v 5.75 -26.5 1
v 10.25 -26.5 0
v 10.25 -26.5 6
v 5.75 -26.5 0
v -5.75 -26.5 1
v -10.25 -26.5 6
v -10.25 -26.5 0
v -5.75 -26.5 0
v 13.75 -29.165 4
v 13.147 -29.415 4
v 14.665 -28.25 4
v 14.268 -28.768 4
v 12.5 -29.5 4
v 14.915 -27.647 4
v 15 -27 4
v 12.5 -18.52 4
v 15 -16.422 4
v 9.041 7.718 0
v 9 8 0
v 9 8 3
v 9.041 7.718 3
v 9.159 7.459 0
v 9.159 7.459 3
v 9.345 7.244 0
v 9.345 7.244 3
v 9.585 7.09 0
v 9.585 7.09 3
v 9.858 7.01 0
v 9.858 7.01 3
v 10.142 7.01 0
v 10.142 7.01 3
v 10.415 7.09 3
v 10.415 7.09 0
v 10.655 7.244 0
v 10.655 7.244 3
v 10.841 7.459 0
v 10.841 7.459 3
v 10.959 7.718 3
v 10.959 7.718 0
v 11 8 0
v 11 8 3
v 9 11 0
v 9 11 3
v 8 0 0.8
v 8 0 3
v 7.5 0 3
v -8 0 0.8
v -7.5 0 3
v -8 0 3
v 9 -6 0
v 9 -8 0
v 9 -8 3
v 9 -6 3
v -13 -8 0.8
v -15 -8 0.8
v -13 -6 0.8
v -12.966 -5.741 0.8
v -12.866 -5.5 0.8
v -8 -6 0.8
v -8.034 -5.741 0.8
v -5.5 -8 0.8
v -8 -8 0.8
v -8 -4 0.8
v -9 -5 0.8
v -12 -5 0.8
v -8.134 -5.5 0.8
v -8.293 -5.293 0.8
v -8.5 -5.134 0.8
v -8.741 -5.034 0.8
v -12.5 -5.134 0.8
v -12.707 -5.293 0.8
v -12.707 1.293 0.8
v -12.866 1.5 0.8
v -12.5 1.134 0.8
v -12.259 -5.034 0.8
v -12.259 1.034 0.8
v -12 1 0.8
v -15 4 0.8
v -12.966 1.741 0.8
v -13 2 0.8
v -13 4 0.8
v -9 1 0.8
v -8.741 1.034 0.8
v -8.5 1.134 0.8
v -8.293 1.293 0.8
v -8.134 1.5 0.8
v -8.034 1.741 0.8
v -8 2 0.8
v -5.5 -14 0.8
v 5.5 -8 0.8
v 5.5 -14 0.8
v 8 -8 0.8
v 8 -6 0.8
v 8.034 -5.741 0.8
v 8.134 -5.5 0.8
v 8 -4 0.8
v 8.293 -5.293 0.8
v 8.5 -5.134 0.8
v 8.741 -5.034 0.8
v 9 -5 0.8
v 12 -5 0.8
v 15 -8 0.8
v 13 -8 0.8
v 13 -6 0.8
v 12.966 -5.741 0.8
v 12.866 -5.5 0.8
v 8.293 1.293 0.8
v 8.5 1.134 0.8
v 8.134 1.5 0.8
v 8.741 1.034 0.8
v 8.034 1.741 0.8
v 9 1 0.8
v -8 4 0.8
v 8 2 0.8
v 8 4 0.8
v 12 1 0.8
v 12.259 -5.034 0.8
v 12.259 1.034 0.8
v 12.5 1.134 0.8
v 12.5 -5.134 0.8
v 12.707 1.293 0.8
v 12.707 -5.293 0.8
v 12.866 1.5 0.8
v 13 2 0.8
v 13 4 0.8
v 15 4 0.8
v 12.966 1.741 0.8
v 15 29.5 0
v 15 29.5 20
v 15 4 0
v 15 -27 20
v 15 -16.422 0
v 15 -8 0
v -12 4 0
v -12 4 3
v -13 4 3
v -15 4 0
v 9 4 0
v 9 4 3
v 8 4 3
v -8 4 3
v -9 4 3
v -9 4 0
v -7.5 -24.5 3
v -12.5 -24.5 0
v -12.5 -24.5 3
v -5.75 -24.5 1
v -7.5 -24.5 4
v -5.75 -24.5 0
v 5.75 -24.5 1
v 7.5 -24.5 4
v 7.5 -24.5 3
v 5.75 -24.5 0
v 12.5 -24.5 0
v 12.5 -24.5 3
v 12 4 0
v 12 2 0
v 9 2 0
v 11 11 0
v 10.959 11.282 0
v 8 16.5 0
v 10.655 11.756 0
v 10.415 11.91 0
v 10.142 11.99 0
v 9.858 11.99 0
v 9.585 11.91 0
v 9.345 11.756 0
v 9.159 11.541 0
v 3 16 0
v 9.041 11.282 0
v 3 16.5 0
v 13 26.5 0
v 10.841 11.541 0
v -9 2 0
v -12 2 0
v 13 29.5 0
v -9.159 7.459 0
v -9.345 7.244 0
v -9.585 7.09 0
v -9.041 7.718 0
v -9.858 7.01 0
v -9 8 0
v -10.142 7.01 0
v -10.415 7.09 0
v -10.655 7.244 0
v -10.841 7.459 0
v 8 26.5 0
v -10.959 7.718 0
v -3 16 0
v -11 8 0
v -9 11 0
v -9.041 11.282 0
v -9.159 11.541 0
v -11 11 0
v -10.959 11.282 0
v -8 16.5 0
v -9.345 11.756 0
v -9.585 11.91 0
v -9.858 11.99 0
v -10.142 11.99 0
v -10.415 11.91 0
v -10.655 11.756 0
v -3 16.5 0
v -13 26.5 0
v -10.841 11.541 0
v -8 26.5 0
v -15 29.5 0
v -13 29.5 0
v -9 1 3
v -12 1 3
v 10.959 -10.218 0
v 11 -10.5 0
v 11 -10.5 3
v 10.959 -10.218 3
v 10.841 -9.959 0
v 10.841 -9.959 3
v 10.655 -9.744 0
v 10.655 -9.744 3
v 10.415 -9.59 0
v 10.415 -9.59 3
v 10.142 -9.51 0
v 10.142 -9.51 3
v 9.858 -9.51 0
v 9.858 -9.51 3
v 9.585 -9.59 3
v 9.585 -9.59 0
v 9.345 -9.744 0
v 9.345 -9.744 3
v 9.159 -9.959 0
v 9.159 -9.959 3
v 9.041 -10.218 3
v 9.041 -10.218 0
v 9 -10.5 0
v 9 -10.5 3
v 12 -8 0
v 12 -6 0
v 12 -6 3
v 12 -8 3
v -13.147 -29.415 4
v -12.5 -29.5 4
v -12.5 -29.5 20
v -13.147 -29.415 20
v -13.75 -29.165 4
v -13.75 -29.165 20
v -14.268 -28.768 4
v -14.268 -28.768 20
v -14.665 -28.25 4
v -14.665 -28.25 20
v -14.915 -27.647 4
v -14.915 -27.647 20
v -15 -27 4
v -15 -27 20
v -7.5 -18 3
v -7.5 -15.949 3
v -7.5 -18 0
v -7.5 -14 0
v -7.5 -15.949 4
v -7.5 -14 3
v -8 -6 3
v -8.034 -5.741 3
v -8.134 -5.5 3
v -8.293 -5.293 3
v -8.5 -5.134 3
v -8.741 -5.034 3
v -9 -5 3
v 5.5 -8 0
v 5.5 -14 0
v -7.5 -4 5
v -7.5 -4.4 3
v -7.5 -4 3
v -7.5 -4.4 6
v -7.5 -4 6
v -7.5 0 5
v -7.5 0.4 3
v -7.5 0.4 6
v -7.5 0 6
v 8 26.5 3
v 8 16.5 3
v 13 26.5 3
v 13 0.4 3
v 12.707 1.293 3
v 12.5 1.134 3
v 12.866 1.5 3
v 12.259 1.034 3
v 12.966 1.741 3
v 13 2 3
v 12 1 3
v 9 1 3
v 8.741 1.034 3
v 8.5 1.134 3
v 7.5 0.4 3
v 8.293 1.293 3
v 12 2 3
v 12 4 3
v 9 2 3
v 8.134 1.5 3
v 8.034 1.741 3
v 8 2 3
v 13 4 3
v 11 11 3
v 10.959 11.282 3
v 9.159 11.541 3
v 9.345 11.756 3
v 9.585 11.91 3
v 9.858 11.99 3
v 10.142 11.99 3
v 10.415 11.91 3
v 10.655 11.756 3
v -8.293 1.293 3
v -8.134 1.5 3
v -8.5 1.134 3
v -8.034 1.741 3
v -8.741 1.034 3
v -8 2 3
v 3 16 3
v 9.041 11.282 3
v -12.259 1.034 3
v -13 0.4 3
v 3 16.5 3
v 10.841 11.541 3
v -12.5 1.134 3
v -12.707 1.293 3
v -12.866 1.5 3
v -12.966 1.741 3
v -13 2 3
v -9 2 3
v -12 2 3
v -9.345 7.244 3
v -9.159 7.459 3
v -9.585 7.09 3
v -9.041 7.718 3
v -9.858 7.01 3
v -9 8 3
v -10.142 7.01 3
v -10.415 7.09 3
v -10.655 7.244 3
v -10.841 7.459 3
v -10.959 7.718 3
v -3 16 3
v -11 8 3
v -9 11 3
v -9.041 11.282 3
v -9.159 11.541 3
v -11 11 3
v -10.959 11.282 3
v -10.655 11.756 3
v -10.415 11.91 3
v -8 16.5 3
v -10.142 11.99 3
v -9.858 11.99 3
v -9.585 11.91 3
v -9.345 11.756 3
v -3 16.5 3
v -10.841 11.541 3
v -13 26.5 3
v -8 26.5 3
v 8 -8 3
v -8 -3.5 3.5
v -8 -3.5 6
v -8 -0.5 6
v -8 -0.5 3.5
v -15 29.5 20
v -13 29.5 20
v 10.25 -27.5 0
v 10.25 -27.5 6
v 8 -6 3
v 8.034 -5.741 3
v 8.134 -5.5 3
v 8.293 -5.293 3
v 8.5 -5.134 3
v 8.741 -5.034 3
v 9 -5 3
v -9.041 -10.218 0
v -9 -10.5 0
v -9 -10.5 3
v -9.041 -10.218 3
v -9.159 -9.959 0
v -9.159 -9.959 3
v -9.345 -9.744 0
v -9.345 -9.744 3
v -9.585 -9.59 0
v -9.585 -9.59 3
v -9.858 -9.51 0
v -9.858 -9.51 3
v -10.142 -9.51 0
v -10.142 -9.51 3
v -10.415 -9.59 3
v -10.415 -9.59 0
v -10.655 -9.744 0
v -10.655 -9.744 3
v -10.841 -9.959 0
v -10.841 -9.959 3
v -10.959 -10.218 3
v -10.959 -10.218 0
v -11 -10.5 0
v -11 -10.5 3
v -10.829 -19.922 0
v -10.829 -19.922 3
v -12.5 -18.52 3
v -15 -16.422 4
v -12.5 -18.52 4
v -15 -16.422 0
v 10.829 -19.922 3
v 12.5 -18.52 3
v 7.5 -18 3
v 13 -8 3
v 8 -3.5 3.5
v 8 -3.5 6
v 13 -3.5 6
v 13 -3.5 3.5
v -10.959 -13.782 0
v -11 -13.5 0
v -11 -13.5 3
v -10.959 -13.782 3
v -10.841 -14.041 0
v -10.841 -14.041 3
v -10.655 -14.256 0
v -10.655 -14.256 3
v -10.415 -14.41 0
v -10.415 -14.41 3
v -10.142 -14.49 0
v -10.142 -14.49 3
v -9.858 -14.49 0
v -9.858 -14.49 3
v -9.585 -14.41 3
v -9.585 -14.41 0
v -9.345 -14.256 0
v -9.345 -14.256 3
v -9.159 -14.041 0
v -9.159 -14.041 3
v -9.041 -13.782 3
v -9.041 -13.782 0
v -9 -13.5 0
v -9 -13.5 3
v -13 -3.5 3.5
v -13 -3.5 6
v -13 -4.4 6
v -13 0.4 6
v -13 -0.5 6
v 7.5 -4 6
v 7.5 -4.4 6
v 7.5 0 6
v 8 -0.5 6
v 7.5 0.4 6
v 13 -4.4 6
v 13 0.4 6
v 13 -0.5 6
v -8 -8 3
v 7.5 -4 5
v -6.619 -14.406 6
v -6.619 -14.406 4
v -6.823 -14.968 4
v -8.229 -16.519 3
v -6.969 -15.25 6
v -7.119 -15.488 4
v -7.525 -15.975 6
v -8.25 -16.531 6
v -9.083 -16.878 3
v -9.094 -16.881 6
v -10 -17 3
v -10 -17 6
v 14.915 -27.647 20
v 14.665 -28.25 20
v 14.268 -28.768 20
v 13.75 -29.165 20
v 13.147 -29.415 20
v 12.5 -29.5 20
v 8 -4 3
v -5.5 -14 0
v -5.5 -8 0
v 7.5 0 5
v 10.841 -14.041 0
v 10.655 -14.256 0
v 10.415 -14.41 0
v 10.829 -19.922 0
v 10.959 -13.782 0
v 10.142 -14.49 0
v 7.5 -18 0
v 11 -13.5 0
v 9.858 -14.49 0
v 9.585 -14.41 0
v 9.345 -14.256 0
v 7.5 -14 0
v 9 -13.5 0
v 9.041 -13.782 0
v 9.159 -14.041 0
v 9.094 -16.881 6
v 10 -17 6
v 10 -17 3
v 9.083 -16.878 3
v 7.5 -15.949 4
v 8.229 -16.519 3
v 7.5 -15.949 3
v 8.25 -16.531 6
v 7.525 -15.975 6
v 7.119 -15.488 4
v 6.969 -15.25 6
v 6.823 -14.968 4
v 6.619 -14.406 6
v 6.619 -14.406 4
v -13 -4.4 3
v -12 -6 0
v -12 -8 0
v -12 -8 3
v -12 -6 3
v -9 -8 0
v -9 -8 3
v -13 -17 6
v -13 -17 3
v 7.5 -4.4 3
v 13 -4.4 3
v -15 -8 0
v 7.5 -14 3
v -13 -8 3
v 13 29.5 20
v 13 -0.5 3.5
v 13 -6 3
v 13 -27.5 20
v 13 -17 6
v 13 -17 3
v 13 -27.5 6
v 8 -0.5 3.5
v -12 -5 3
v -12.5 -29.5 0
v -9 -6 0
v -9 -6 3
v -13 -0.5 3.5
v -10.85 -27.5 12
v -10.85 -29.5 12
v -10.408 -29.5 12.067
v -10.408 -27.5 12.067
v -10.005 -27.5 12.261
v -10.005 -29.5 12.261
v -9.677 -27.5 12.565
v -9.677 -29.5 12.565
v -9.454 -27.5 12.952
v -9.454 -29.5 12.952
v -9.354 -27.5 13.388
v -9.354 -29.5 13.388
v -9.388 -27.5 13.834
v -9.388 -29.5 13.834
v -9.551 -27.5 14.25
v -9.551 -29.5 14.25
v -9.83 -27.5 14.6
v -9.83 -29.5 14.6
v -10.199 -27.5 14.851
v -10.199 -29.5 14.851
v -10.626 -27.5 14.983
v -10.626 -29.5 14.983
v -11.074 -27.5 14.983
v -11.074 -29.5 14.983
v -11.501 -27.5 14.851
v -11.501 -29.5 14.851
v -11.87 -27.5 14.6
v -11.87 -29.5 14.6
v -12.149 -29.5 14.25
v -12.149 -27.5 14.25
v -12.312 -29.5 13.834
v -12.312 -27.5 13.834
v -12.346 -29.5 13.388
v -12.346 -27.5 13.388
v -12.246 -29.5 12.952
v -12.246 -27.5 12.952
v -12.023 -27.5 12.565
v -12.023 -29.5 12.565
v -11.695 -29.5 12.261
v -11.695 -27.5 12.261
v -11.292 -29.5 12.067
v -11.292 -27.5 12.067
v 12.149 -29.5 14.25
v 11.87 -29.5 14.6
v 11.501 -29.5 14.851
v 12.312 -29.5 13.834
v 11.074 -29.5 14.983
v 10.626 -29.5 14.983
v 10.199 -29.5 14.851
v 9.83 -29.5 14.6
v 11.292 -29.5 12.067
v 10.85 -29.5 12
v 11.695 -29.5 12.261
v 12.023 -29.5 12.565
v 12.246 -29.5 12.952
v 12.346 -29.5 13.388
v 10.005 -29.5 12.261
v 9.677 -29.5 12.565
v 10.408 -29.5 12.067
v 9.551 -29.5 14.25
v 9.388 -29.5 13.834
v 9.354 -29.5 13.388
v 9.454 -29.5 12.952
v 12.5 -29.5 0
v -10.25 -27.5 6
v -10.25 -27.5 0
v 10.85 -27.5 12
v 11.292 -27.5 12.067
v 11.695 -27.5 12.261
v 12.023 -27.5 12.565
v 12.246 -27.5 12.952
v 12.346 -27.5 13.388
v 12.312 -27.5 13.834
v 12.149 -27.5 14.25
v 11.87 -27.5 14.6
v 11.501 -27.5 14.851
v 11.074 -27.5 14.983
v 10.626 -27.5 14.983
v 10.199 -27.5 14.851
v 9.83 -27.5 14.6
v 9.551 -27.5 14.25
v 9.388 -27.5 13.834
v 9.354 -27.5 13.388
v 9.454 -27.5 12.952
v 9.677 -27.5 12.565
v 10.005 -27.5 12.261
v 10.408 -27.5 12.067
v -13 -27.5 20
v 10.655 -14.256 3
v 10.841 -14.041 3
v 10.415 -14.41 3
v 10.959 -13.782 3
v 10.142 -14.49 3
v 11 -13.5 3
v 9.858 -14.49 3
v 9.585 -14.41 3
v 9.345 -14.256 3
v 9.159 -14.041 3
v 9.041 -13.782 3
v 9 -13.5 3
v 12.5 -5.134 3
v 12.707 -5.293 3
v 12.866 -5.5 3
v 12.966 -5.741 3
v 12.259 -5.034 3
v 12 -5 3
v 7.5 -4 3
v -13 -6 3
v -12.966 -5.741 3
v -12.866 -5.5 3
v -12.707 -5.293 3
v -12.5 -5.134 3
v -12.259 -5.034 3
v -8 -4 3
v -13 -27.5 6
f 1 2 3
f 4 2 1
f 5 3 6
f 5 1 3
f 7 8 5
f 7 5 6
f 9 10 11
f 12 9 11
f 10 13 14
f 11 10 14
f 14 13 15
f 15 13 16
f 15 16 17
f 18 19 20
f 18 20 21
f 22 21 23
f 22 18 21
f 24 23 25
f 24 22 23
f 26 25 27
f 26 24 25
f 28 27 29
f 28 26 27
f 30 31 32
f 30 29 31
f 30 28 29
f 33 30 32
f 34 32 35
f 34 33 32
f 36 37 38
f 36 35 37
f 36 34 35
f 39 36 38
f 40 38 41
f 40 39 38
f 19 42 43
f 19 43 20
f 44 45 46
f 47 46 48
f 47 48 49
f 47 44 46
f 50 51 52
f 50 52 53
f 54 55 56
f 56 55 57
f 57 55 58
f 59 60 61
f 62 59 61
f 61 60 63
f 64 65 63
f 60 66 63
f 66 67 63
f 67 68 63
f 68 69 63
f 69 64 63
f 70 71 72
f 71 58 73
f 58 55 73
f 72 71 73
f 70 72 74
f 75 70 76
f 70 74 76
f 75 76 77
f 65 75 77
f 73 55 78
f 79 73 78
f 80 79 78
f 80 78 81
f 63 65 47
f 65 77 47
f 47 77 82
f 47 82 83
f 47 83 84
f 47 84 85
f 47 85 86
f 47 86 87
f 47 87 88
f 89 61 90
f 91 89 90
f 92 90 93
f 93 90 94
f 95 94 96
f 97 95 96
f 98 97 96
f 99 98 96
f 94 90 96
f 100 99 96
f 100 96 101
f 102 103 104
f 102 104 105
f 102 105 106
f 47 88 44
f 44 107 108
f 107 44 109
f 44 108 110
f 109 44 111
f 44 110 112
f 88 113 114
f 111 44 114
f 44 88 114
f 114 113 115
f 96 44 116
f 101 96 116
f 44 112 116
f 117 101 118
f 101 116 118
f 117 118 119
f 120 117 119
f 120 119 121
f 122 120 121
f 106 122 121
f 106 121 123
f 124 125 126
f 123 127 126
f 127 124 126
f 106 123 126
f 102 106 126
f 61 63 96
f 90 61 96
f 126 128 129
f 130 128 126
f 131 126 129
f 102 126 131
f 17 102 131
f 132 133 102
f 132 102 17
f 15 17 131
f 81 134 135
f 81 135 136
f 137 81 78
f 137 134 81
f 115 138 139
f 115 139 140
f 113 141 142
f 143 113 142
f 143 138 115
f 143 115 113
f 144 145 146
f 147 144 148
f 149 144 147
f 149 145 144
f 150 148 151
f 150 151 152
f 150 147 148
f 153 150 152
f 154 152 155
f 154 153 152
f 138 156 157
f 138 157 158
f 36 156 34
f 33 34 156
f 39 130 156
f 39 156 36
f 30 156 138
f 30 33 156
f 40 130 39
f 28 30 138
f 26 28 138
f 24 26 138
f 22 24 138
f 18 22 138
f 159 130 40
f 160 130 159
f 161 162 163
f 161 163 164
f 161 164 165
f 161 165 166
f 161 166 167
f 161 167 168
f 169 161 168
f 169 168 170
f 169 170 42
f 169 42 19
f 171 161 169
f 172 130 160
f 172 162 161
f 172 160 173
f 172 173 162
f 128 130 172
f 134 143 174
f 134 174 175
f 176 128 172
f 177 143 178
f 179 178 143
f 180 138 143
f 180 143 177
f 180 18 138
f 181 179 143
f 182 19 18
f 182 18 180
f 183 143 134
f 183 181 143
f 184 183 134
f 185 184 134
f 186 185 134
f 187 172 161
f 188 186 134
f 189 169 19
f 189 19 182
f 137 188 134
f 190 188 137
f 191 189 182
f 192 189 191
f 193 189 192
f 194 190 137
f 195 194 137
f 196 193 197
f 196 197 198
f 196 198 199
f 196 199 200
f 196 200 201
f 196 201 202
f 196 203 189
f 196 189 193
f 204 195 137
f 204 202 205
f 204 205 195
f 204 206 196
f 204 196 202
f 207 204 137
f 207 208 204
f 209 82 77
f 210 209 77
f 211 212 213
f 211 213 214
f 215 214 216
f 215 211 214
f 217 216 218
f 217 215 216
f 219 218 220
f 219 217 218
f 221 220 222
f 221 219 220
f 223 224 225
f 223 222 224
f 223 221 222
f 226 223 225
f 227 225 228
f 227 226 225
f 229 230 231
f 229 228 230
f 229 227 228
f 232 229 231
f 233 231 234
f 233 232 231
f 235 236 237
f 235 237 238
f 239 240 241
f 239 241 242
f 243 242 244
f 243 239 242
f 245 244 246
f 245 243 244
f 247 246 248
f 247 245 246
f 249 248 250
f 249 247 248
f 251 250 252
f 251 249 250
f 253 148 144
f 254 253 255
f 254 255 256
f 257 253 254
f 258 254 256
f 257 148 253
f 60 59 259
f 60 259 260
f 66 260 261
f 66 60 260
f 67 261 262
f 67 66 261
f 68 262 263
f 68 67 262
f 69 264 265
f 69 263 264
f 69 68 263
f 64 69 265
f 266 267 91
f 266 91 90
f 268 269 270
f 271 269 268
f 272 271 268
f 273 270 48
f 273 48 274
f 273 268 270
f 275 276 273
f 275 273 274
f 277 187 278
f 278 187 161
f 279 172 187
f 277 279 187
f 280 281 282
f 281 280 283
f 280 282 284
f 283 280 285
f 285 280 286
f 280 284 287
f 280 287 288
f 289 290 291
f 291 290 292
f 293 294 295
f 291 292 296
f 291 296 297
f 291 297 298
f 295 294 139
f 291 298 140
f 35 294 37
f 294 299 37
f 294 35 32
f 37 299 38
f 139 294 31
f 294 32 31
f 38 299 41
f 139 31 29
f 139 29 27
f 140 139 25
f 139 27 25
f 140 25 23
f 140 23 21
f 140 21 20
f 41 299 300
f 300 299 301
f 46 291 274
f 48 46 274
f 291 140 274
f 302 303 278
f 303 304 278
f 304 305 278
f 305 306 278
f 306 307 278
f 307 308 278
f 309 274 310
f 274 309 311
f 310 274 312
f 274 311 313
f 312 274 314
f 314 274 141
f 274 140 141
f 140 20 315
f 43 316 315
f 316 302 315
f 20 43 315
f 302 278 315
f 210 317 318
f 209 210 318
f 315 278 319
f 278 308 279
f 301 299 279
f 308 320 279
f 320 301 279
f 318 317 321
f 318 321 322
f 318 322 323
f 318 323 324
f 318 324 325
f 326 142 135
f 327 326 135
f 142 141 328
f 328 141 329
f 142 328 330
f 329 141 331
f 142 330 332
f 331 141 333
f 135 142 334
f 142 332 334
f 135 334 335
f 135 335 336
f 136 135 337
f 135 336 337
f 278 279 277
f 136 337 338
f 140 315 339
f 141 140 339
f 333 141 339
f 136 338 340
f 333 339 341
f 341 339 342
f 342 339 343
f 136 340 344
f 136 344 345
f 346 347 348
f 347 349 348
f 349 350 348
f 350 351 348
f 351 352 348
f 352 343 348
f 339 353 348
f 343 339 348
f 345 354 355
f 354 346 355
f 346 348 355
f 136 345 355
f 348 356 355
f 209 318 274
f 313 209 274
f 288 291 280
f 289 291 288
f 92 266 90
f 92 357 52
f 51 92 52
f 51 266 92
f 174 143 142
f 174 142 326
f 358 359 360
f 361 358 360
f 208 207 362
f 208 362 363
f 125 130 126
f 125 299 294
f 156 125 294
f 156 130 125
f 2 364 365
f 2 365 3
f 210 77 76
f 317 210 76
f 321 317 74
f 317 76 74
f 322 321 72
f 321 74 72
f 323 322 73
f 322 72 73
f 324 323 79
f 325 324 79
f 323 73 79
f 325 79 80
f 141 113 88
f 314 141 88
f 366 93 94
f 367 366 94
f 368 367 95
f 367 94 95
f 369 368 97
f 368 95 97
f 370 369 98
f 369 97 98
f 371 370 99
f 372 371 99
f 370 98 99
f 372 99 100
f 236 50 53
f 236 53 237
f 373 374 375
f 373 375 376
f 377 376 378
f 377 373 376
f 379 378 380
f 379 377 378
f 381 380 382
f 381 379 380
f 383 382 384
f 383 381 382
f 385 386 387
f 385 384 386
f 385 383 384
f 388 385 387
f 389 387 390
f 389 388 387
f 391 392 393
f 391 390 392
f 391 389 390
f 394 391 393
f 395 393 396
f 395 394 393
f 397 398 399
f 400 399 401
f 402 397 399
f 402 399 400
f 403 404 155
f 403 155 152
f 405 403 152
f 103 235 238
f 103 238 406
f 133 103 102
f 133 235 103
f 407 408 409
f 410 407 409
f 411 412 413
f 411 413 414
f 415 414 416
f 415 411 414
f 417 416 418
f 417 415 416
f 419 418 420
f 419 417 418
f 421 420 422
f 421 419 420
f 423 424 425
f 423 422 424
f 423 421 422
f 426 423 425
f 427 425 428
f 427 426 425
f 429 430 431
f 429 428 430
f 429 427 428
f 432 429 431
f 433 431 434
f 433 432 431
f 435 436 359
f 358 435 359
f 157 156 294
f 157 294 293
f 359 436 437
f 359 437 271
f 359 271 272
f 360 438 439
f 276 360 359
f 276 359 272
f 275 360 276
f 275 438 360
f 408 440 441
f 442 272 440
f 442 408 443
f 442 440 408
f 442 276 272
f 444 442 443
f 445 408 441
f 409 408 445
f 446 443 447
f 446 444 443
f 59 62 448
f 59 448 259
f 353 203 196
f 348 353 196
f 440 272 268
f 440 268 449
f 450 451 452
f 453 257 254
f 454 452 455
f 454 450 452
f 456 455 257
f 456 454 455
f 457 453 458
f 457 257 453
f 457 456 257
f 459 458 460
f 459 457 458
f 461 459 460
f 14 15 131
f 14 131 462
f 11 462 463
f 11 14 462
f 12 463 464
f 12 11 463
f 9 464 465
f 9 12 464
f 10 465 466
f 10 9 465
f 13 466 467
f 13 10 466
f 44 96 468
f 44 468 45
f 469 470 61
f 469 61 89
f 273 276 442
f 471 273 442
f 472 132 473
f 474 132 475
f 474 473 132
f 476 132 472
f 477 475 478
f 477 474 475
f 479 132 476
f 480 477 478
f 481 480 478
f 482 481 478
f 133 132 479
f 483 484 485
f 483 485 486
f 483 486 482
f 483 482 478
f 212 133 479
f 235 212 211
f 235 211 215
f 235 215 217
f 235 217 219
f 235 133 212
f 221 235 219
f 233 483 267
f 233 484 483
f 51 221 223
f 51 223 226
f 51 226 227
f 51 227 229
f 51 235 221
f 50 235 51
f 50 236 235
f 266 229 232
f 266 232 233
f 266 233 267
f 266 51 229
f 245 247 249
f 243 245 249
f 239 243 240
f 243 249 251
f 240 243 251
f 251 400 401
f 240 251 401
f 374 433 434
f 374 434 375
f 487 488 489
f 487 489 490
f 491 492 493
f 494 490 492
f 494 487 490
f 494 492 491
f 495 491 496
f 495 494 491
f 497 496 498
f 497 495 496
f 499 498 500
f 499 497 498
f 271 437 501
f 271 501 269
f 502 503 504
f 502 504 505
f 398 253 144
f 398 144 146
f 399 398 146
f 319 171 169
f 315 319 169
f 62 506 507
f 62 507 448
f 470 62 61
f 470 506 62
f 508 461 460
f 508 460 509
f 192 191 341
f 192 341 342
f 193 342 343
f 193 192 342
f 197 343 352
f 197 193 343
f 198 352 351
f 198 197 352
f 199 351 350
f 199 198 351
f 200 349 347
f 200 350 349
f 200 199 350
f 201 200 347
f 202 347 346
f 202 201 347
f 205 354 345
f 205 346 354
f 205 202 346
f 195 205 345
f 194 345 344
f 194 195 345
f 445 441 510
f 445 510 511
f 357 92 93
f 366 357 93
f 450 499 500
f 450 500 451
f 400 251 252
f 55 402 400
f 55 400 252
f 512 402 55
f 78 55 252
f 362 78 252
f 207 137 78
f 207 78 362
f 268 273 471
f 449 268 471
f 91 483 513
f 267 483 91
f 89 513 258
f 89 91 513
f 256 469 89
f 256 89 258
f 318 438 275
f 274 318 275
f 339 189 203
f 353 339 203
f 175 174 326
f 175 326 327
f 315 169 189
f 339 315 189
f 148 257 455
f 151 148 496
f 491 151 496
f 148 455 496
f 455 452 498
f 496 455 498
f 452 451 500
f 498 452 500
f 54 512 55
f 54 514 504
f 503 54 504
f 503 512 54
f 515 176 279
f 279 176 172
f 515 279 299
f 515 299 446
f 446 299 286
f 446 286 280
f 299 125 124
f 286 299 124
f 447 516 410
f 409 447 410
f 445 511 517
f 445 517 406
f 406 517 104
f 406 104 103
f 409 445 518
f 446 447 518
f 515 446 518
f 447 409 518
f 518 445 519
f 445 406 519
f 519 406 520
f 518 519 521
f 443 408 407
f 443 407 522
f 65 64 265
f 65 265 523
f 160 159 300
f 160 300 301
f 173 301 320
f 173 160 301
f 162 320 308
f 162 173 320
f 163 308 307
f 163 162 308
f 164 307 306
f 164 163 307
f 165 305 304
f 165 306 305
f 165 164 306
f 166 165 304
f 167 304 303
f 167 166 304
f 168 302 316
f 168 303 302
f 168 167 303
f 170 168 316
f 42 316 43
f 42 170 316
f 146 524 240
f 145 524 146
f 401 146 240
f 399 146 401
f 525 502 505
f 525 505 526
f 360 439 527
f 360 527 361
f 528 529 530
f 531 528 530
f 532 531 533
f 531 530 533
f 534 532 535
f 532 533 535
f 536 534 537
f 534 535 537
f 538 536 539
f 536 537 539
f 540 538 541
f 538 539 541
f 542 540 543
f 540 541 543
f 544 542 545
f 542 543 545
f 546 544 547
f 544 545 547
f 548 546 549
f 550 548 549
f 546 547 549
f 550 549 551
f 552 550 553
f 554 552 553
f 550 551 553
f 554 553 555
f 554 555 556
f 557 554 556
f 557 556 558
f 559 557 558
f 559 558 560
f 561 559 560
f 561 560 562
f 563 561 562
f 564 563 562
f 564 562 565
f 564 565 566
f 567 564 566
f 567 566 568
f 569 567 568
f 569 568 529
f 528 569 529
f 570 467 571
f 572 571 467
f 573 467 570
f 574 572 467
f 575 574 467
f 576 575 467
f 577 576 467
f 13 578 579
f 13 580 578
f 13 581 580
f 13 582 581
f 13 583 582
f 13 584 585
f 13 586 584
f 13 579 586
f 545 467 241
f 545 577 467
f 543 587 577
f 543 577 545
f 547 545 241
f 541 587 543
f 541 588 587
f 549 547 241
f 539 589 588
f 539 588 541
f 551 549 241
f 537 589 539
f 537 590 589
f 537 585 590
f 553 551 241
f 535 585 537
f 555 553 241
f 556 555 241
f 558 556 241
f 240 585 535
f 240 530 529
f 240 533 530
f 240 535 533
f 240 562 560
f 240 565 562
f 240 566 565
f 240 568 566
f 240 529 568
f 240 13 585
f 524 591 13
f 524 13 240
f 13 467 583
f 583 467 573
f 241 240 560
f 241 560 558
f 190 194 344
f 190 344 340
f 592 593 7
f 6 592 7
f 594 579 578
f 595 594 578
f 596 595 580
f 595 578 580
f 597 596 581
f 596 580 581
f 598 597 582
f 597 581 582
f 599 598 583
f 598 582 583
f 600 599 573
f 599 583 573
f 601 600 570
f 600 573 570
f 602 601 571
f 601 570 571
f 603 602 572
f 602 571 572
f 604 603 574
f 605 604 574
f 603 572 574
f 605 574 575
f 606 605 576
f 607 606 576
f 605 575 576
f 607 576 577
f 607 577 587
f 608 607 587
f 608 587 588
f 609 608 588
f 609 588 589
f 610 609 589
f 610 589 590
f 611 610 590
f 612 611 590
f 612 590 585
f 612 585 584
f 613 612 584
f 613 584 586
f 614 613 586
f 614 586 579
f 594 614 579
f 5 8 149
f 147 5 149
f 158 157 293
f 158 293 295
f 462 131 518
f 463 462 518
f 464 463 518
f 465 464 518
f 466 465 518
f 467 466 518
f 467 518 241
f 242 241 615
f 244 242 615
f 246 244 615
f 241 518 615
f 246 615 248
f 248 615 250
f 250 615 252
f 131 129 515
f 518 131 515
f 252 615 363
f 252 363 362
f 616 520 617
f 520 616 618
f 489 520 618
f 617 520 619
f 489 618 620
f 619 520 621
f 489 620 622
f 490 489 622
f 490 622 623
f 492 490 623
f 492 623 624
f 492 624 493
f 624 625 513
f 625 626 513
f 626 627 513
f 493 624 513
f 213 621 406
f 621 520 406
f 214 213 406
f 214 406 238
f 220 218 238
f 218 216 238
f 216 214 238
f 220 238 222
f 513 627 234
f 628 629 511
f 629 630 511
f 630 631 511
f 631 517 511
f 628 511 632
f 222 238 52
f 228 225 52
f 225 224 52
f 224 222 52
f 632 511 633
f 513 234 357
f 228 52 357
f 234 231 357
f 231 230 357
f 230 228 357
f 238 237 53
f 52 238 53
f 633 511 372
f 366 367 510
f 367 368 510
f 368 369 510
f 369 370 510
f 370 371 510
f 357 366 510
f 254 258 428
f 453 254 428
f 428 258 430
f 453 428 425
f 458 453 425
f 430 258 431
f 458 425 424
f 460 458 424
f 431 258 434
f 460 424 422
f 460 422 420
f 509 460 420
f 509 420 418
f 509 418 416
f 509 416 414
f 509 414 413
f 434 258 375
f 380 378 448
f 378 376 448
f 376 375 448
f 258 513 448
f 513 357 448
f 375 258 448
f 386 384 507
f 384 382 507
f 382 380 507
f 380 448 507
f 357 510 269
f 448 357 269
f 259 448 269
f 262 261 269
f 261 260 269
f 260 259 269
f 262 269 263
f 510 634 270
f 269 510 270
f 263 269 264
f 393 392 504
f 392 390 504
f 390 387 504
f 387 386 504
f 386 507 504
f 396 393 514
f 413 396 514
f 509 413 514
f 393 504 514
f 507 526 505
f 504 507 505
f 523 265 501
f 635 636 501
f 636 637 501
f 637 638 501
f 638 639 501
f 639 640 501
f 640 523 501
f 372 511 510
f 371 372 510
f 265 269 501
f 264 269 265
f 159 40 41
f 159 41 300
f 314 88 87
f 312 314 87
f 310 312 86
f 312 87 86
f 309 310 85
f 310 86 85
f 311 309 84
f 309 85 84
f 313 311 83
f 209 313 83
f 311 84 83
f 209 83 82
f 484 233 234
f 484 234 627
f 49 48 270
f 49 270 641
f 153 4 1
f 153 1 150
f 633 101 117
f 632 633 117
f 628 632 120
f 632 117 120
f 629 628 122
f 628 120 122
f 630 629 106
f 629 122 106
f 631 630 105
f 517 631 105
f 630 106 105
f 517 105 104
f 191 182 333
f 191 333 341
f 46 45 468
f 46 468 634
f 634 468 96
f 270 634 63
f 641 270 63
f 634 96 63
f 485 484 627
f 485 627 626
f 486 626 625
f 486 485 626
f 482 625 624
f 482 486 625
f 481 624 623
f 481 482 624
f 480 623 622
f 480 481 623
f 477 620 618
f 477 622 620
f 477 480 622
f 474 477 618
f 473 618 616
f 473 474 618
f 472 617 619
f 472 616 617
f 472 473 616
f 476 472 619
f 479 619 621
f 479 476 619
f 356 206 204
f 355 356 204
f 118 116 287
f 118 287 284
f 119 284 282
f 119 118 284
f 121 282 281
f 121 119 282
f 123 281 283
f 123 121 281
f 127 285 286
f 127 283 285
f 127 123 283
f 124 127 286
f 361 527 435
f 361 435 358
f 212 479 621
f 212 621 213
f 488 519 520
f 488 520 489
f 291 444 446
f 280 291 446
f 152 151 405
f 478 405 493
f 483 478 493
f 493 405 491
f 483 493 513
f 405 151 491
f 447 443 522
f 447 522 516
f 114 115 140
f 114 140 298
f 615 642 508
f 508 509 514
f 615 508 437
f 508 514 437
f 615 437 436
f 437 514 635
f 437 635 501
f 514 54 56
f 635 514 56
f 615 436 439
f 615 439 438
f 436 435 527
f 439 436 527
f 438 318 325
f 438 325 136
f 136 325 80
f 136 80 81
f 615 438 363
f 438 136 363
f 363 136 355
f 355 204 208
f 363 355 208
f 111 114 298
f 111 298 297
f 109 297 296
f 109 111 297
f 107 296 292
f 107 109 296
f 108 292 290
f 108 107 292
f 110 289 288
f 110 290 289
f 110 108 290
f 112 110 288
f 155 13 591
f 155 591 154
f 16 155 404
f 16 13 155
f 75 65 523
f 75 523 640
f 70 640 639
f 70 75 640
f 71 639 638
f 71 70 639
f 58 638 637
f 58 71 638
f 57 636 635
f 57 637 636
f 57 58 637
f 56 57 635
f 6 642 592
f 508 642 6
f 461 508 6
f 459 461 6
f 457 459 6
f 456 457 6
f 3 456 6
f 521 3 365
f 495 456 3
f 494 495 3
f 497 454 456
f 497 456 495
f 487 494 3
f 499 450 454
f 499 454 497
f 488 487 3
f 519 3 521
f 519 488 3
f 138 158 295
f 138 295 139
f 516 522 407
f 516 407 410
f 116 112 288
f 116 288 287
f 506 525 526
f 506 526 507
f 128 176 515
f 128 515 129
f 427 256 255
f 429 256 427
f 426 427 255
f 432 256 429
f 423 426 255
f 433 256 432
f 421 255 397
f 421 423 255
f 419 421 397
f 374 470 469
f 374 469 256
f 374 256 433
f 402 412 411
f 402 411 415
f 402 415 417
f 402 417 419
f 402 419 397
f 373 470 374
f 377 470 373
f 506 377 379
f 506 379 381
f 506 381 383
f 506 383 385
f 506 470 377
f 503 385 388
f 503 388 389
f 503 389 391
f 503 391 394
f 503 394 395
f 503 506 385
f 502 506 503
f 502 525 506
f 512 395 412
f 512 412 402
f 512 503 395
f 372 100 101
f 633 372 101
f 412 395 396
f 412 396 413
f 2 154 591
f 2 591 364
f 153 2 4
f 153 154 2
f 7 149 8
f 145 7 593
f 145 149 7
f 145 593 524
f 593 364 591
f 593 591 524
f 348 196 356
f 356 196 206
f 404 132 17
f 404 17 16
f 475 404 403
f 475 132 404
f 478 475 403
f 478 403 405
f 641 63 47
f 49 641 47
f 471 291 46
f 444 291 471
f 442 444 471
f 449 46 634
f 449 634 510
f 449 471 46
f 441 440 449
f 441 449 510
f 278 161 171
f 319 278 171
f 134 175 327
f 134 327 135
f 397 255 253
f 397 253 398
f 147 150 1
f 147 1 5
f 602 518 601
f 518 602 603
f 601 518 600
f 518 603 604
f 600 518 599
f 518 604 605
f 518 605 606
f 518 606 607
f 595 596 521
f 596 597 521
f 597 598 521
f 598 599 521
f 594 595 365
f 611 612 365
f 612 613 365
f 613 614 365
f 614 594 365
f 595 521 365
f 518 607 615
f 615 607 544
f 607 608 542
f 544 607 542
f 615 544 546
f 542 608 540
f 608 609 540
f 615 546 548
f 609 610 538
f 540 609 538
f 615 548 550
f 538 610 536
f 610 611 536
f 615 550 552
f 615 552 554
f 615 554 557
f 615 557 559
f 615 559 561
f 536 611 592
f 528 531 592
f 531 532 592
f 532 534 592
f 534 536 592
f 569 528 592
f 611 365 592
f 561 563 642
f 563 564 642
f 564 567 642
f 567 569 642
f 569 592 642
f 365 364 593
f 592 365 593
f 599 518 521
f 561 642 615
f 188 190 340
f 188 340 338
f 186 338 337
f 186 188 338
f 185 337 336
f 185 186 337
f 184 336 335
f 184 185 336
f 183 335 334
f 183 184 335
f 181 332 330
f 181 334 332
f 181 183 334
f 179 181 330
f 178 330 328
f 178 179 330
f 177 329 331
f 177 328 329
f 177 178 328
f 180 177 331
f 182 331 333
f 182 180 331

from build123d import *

# Parameters (mm, degrees)
BOSS_EXTRUDE1_DEPTH = 20
CUT_EXTRUDE1_DEPTH  = 39.668462602
CUT_EXTRUDE2_DEPTH  = 39.668462602
SKETCH4_W           = 26
SKETCH4_H           = 57
CUT_EXTRUDE3_DEPTH  = 14
CUT_EXTRUDE4_DEPTH  = 0.8
CUT_EXTRUDE5_DEPTH  = 39.260815464
CUT_EXTRUDE6_DEPTH  = 4
SKETCH8_W           = 5
SKETCH8_H           = 6.5
BOSS_EXTRUDE2_DEPTH = 1
SKETCH9_W           = 20.5
SKETCH9_H           = 1
CUT_EXTRUDE7_DEPTH  = 39.668462602
SKETCH10_W          = 11.5
SKETCH10_H          = 2
CUT_EXTRUDE8_DEPTH  = 1
CUT_EXTRUDE9_DEPTH  = 3
CUT_EXTRUDE10_REACH = 40.668
SKETCH12_W          = 15
SKETCH12_H          = 2
SKETCH13_W          = 16
SKETCH13_H          = 4
CUT_EXTRUDE11_DEPTH = 2.2
SKETCH14_W          = 5
SKETCH14_H          = 3
CUT_EXTRUDE12_DEPTH = 2.5
CUT_EXTRUDE13_REACH = 66.078
SKETCH15_R          = 1.5


with BuildPart() as part:
    # Sketch1 → Boss-Extrude1 (new body)
    with BuildSketch(Plane.XY):
        with BuildLine():
            Line((-15, 29.5), (15, 29.5))
            Line((15, 29.5), (15, -27))
            ThreePointArc((15, -27), (14.267766953, -28.767766953), (12.5, -29.5))
            Line((12.5, -29.5), (-12.5, -29.5))
            ThreePointArc((-12.5, -29.5), (-14.267766953, -28.767766953), (-15, -27))
            Line((-15, -27), (-15, 29.5))
        make_face()
    extrude(amount=BOSS_EXTRUDE1_DEPTH)

    # Sketch2 → Cut-Extrude1 (cut, through all)
    with BuildSketch(Plane(origin=(0, 0, 0), x_dir=(-1, 0, 0), z_dir=(0, 0, -1))):
        Polygon((-13, 29.5), (-13, 26.5), (-8, 26.5), (-8, 16.5), (-3, 16.5), (-3, 16), (3, 16), (3, 16.5), (8, 16.5), (8, 26.5), (13, 26.5), (13, 29.5), align=None)
    extrude(amount=-CUT_EXTRUDE1_DEPTH, mode=Mode.SUBTRACT)

    # Sketch3 → Cut-Extrude2 (cut, through all)
    with BuildSketch(Plane(origin=(0, 0, 0), x_dir=(-1, 0, 0), z_dir=(0, 0, -1))):
        with BuildLine():
            Line((-9, 11), (-9, 8))
            ThreePointArc((-9, 8), (-10, 7), (-11, 8))
            Line((-11, 8), (-11, 11))
            ThreePointArc((-11, 11), (-10, 12), (-9, 11))
        make_face()
        with BuildLine():
            Line((9, 8), (9, 11))
            ThreePointArc((9, 11), (10, 12), (11, 11))
            Line((11, 11), (11, 8))
            ThreePointArc((11, 8), (10, 7), (9, 8))
        make_face()
        with BuildLine():
            Line((9, -13.5), (9, -10.5))
            ThreePointArc((9, -10.5), (10, -9.5), (11, -10.5))
            Line((11, -10.5), (11, -13.5))
            ThreePointArc((11, -13.5), (10, -14.5), (9, -13.5))
        make_face()
        with BuildLine():
            Line((-9, -10.5), (-9, -13.5))
            ThreePointArc((-9, -13.5), (-10, -14.5), (-11, -13.5))
            Line((-11, -13.5), (-11, -10.5))
            ThreePointArc((-11, -10.5), (-10, -9.5), (-9, -10.5))
        make_face()
    extrude(amount=-CUT_EXTRUDE2_DEPTH, mode=Mode.SUBTRACT)

    # Sketch4 → Cut-Extrude3 (cut)
    with BuildSketch(Plane.XY.offset(20)):
        with Locations((0, 1)):
            Rectangle(SKETCH4_W, SKETCH4_H)
    extrude(amount=-CUT_EXTRUDE3_DEPTH, mode=Mode.SUBTRACT)

    # Sketch5 → Cut-Extrude4 (cut)
    with BuildSketch(Plane(origin=(0, 0, 0), x_dir=(-1, 0, 0), z_dir=(0, 0, -1))):
        Polygon((-15, 4), (-12, 4), (-12, 2), (-9, 2), (-9, 4), (9, 4), (9, 2), (12, 2), (12, 4), (15, 4), (15, -8), (12, -8), (12, -6), (9, -6), (9, -8), (5.5, -8), (5.5, -14), (-5.5, -14), (-5.5, -8), (-9, -8), (-9, -6), (-12, -6), (-12, -8), (-15, -8), align=None)
    extrude(amount=-CUT_EXTRUDE4_DEPTH, mode=Mode.SUBTRACT)

    # Sketch6 → Cut-Extrude5 (cut, through all)
    with BuildSketch(Plane(origin=(0, 0, 0.8), x_dir=(-1, 0, 0), z_dir=(0, 0, -1))):
        with BuildLine():
            Line((-12, 4), (-12, 2))
            Line((-12, 2), (-9, 2))
            Line((-9, 2), (-9, 4))
            Line((-9, 4), (-8, 4))
            Line((-8, 4), (-8, 2))
            ThreePointArc((-8, 2), (-8.292893219, 1.292893219), (-9, 1))
            Line((-9, 1), (-12, 1))
            ThreePointArc((-12, 1), (-12.707106781, 1.292893219), (-13, 2))
            Line((-13, 2), (-13, 4))
            Line((-13, 4), (-12, 4))
        make_face()
        with BuildLine():
            Line((13, 4), (12, 4))
            Line((12, 4), (12, 2))
            Line((12, 2), (9, 2))
            Line((9, 2), (9, 4))
            Line((9, 4), (8, 4))
            Line((8, 4), (8, 2))
            ThreePointArc((8, 2), (8.292893219, 1.292893219), (9, 1))
            Line((9, 1), (12, 1))
            ThreePointArc((12, 1), (12.707106781, 1.292893219), (13, 2))
            Line((13, 2), (13, 4))
        make_face()
        with BuildLine():
            Line((12, -8), (12, -6))
            Line((12, -6), (9, -6))
            Line((9, -6), (9, -8))
            Line((9, -8), (8, -8))
            Line((8, -8), (8, -6))
            ThreePointArc((8, -6), (8.292893219, -5.292893219), (9, -5))
            Line((9, -5), (12, -5))
            ThreePointArc((12, -5), (12.707106781, -5.292893219), (13, -6))
            Line((13, -6), (13, -8))
            Line((13, -8), (12, -8))
        make_face()
        with BuildLine():
            Line((-13, -8), (-12, -8))
            Line((-12, -8), (-12, -6))
            Line((-12, -6), (-9, -6))
            Line((-9, -6), (-9, -8))
            Line((-9, -8), (-8, -8))
            Line((-8, -8), (-8, -6))
            ThreePointArc((-8, -6), (-8.292893219, -5.292893219), (-9, -5))
            Line((-9, -5), (-12, -5))
            ThreePointArc((-12, -5), (-12.707106781, -5.292893219), (-13, -6))
            Line((-13, -6), (-13, -8))
        make_face()
    extrude(amount=-CUT_EXTRUDE5_DEPTH, mode=Mode.SUBTRACT)

    # Sketch7 → Cut-Extrude6 (cut)
    with BuildSketch(Plane(origin=(0, 0, 0), x_dir=(-1, 0, 0), z_dir=(0, 0, -1))):
        with BuildLine():
            Line((-7.5, -14), (7.5, -14))
            Line((7.5, -14), (7.5, -18))
            Line((7.5, -18), (10.828862426, -19.921919618))
            Line((10.828862426, -19.921919618), (15, -16.421919618))
            Line((15, -16.421919618), (15, -27))
            ThreePointArc((15, -27), (14.267766953, -28.767766953), (12.5, -29.5))
            Line((12.5, -29.5), (12.5, -24.5))
            Line((12.5, -24.5), (-12.5, -24.5))
            Line((-12.5, -24.5), (-12.5, -29.5))
            ThreePointArc((-12.5, -29.5), (-14.267766953, -28.767766953), (-15, -27))
            Line((-15, -27), (-15, -16.421919618))
            Line((-15, -16.421919618), (-10.828862426, -19.921919618))
            Line((-10.828862426, -19.921919618), (-7.5, -18))
            Line((-7.5, -18), (-7.5, -14))
        make_face()
    extrude(amount=-CUT_EXTRUDE6_DEPTH, mode=Mode.SUBTRACT)

    # Sketch8 → Boss-Extrude2 (add)
    with BuildSketch(Plane(origin=(0, 0, 4), x_dir=(-1, 0, 0), z_dir=(0, 0, -1))):
        with Locations((-10, -21.25)):
            Rectangle(SKETCH8_W, SKETCH8_H)
        with Locations((10, -21.25)):
            Rectangle(SKETCH8_W, SKETCH8_H)
    extrude(amount=BOSS_EXTRUDE2_DEPTH)

    # Sketch9 → Cut-Extrude7 (cut, through all)
    with BuildSketch(Plane(origin=(0, 0, 0), x_dir=(-1, 0, 0), z_dir=(0, 0, -1))):
        with Locations((0, -27)):
            Rectangle(SKETCH9_W, SKETCH9_H)
    extrude(amount=-CUT_EXTRUDE7_DEPTH, mode=Mode.SUBTRACT)

    # Sketch10 → Cut-Extrude8 (cut)
    with BuildSketch(Plane(origin=(0, 0, 0), x_dir=(-1, 0, 0), z_dir=(0, 0, -1))):
        with Locations((0, -25.5)):
            Rectangle(SKETCH10_W, SKETCH10_H)
    extrude(amount=-CUT_EXTRUDE8_DEPTH, mode=Mode.SUBTRACT)

    # Sketch11 → Cut-Extrude9 (cut)
    with BuildSketch(Plane.XY.offset(6)):
        Polygon((-13, 26.5), (-13, 0.4), (-7.5, 0.4), (-7.5, 0), (7.5, 0), (7.5, 0.4), (13, 0.4), (13, 26.5), align=None)
        with BuildLine():
            Line((7.5, -4.4), (13, -4.4))
            Line((13, -4.4), (13, -17))
            Line((13, -17), (10, -17))
            ThreePointArc((10, -17), (7.869334998, -16.276736691), (6.619259608, -14.405866658))
            Line((6.619259608, -14.405866658), (-6.619259608, -14.405866658))
            ThreePointArc((-6.619259608, -14.405866658), (-7.869334998, -16.276736691), (-10, -17))
            Line((-10, -17), (-13, -17))
            Line((-13, -17), (-13, -4.4))
            Line((-13, -4.4), (-7.5, -4.4))
            Line((-7.5, -4.4), (-7.5, -4))
            Line((-7.5, -4), (7.5, -4))
            Line((7.5, -4), (7.5, -4.4))
        make_face()
    extrude(amount=-CUT_EXTRUDE9_DEPTH, mode=Mode.SUBTRACT)

    # Sketch12 → Cut-Extrude10 (cut, up to next)
    with BuildSketch(Plane(origin=(0, 0, 0), x_dir=(1, 0, 0), z_dir=(0, 1, 0)), mode=Mode.PRIVATE) as cut_extrude10_sk1:
        with Locations((0, -4)):
            Rectangle(SKETCH12_W, SKETCH12_H)
    cut_extrude10_tool1 = extrude(cut_extrude10_sk1.sketch, amount=-CUT_EXTRUDE10_REACH, mode=Mode.PRIVATE) & part.part
    add(cut_extrude10_tool1.solids().sort_by_distance((0, 0, 4))[0], mode=Mode.SUBTRACT)

    # Sketch13 → Cut-Extrude11 (cut)
    with BuildSketch(Plane(origin=(0, 0, 0.8), x_dir=(-1, 0, 0), z_dir=(0, 0, -1))):
        with Locations((0, -2)):
            Rectangle(SKETCH13_W, SKETCH13_H)
    extrude(amount=-CUT_EXTRUDE11_DEPTH, mode=Mode.SUBTRACT)

    # Sketch14 → Cut-Extrude12 (cut)
    with BuildSketch(Plane.XY.offset(6)):
        with Locations((-10.5, -2)):
            Rectangle(SKETCH14_W, SKETCH14_H)
        with Locations((10.5, -2)):
            Rectangle(SKETCH14_W, SKETCH14_H)
    extrude(amount=-CUT_EXTRUDE12_DEPTH, mode=Mode.SUBTRACT)

    # Sketch15 → Cut-Extrude13 (cut, up to next)
    with BuildSketch(Plane.XZ.offset(29.5), mode=Mode.PRIVATE) as cut_extrude13_sk1:
        with Locations(Location((-10.85, 13.5, 0), (0, 0, 270))):
            Circle(SKETCH15_R)
    cut_extrude13_tool1 = extrude(cut_extrude13_sk1.sketch, amount=-CUT_EXTRUDE13_REACH, mode=Mode.PRIVATE) & part.part
    # Sketch15 → Cut-Extrude13 (cut, up to next)
    with BuildSketch(Plane.XZ.offset(29.5), mode=Mode.PRIVATE) as cut_extrude13_sk2:
        with Locations(Location((10.85, 13.5, 0), (0, 0, 270))):
            Circle(SKETCH15_R)
    cut_extrude13_tool2 = extrude(cut_extrude13_sk2.sketch, amount=-CUT_EXTRUDE13_REACH, mode=Mode.PRIVATE) & part.part
    add(cut_extrude13_tool1.solids().sort_by_distance((-10.85, -29.5, 13.5))[0], mode=Mode.SUBTRACT)
    add(cut_extrude13_tool2.solids().sort_by_distance((10.85, -29.5, 13.5))[0], mode=Mode.SUBTRACT)


solid = part.part
